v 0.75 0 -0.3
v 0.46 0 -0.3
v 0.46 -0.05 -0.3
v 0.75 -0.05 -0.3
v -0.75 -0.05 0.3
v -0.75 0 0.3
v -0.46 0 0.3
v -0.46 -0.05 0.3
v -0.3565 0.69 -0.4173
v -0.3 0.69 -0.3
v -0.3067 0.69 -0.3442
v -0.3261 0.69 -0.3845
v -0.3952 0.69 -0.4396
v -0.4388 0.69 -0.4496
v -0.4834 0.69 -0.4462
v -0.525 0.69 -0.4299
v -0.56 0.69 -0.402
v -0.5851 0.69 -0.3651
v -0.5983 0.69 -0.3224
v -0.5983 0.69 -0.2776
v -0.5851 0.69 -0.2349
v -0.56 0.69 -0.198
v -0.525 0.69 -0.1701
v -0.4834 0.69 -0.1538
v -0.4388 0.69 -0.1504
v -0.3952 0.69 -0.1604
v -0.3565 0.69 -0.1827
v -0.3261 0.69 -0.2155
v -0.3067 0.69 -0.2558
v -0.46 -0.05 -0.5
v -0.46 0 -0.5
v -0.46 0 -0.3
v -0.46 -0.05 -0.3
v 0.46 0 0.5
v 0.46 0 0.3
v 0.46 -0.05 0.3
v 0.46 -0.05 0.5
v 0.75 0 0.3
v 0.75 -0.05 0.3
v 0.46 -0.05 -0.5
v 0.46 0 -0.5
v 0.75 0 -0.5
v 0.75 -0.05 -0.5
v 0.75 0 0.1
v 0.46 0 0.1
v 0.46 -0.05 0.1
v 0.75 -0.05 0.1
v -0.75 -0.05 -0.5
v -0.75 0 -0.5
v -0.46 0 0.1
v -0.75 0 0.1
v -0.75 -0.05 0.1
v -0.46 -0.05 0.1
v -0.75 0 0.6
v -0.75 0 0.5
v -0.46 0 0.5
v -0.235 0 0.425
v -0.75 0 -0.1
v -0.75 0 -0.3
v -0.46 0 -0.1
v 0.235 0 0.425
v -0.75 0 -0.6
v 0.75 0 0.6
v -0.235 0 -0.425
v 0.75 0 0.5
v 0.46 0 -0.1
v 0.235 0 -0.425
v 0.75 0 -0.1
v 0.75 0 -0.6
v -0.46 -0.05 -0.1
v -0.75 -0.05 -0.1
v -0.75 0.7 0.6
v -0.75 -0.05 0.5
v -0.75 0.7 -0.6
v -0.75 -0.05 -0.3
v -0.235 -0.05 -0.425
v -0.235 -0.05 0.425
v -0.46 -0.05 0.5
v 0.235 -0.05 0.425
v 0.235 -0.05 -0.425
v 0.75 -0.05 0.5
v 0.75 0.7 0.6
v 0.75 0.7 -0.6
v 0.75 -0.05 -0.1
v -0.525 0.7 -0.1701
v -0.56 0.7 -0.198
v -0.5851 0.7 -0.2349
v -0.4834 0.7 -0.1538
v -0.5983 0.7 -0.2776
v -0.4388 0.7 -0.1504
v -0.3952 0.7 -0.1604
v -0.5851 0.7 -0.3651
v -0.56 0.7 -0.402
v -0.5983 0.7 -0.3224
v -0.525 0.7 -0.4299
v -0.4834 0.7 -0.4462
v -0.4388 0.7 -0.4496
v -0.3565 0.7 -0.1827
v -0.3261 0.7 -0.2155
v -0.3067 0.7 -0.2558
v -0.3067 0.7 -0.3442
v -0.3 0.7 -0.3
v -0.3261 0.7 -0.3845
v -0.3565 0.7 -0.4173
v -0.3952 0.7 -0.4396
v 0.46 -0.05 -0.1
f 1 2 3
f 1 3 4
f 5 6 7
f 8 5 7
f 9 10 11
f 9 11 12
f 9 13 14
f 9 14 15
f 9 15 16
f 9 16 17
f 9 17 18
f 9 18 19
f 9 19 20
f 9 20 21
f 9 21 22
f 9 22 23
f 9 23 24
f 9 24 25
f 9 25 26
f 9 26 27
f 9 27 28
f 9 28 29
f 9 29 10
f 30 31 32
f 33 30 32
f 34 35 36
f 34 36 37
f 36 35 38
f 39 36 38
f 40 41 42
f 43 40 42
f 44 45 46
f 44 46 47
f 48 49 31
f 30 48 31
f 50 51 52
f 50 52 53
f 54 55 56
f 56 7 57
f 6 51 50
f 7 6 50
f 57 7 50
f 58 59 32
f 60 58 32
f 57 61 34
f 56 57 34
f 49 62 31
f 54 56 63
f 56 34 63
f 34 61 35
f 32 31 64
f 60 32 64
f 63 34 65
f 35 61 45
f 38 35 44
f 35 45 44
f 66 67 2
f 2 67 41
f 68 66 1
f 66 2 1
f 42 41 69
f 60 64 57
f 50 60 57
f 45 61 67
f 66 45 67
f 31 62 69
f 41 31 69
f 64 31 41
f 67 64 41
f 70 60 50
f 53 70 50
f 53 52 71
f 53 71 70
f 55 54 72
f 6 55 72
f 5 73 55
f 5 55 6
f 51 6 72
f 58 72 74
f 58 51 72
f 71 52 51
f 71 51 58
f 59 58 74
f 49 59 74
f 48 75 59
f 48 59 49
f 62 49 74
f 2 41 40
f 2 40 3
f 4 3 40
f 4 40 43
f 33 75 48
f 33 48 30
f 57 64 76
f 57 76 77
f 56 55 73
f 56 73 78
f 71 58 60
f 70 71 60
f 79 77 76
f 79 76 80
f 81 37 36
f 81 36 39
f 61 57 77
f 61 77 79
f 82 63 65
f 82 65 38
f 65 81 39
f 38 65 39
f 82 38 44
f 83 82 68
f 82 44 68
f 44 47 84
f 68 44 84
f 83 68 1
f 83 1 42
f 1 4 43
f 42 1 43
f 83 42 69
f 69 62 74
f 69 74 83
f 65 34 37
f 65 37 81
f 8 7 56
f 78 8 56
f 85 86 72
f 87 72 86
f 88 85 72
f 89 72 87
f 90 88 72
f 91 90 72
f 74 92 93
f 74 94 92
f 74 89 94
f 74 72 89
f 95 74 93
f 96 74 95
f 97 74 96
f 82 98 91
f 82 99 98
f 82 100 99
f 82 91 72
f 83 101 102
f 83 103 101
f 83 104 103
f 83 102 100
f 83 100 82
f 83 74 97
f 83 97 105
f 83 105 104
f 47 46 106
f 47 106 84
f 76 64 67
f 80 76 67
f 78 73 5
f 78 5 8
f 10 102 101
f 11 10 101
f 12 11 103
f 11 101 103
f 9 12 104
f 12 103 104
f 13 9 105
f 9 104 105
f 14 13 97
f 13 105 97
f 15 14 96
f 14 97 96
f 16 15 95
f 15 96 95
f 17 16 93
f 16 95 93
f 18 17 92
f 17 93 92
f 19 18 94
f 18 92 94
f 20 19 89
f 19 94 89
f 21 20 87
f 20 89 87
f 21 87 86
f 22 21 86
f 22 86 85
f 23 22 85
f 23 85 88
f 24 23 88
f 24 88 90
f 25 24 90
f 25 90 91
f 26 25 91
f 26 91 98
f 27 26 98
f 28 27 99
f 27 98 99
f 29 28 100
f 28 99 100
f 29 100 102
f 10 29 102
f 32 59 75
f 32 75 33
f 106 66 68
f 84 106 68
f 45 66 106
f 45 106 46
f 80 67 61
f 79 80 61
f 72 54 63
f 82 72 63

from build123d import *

# Parameters (mm, degrees)
SKETCH1_W           = 1.5
SKETCH1_H           = 1.2
BOSS_EXTRUDE1_DEPTH = 0.7
SKETCH2_W           = 0.29
SKETCH2_H           = 0.2
SKETCH2_W_2         = 0.47
SKETCH2_H_2         = 0.85
BOSS_EXTRUDE2_DEPTH = 0.05
SKETCH3_R           = 0.15
CUT_EXTRUDE1_DEPTH  = 0.01


with BuildPart() as part:
    # Sketch1 → Boss-Extrude1 (new body)
    with BuildSketch(Plane(origin=(0, 0, 0), x_dir=(1, 0, 0), z_dir=(0, 1, 0))):
        Rectangle(SKETCH1_W, SKETCH1_H)
    extrude(amount=BOSS_EXTRUDE1_DEPTH)

    # Sketch2 → Boss-Extrude2 (add)
    with BuildSketch(Plane.XZ):
        with Locations((-0.605, 0.4)):
            Rectangle(SKETCH2_W, SKETCH2_H)
        Rectangle(SKETCH2_W_2, SKETCH2_H_2)
        with Locations((-0.605, -0.4)):
            Rectangle(SKETCH2_W, SKETCH2_H)
        with Locations((-0.605, 0)):
            Rectangle(SKETCH2_W, SKETCH2_H)
        with Locations((0.605, -0.4)):
            Rectangle(SKETCH2_W, SKETCH2_H)
        with Locations((0.605, 0)):
            Rectangle(SKETCH2_W, SKETCH2_H)
        with Locations((0.605, 0.4)):
            Rectangle(SKETCH2_W, SKETCH2_H)
    extrude(amount=BOSS_EXTRUDE2_DEPTH)

    # Sketch3 → Cut-Extrude1 (cut)
    with BuildSketch(Plane(origin=(0, 0.7, 0), x_dir=(1, 0, 0), z_dir=(0, 1, 0))):
        with Locations((-0.45, 0.3)):
            Circle(SKETCH3_R)
    extrude(amount=-CUT_EXTRUDE1_DEPTH, mode=Mode.SUBTRACT)


solid = part.part
